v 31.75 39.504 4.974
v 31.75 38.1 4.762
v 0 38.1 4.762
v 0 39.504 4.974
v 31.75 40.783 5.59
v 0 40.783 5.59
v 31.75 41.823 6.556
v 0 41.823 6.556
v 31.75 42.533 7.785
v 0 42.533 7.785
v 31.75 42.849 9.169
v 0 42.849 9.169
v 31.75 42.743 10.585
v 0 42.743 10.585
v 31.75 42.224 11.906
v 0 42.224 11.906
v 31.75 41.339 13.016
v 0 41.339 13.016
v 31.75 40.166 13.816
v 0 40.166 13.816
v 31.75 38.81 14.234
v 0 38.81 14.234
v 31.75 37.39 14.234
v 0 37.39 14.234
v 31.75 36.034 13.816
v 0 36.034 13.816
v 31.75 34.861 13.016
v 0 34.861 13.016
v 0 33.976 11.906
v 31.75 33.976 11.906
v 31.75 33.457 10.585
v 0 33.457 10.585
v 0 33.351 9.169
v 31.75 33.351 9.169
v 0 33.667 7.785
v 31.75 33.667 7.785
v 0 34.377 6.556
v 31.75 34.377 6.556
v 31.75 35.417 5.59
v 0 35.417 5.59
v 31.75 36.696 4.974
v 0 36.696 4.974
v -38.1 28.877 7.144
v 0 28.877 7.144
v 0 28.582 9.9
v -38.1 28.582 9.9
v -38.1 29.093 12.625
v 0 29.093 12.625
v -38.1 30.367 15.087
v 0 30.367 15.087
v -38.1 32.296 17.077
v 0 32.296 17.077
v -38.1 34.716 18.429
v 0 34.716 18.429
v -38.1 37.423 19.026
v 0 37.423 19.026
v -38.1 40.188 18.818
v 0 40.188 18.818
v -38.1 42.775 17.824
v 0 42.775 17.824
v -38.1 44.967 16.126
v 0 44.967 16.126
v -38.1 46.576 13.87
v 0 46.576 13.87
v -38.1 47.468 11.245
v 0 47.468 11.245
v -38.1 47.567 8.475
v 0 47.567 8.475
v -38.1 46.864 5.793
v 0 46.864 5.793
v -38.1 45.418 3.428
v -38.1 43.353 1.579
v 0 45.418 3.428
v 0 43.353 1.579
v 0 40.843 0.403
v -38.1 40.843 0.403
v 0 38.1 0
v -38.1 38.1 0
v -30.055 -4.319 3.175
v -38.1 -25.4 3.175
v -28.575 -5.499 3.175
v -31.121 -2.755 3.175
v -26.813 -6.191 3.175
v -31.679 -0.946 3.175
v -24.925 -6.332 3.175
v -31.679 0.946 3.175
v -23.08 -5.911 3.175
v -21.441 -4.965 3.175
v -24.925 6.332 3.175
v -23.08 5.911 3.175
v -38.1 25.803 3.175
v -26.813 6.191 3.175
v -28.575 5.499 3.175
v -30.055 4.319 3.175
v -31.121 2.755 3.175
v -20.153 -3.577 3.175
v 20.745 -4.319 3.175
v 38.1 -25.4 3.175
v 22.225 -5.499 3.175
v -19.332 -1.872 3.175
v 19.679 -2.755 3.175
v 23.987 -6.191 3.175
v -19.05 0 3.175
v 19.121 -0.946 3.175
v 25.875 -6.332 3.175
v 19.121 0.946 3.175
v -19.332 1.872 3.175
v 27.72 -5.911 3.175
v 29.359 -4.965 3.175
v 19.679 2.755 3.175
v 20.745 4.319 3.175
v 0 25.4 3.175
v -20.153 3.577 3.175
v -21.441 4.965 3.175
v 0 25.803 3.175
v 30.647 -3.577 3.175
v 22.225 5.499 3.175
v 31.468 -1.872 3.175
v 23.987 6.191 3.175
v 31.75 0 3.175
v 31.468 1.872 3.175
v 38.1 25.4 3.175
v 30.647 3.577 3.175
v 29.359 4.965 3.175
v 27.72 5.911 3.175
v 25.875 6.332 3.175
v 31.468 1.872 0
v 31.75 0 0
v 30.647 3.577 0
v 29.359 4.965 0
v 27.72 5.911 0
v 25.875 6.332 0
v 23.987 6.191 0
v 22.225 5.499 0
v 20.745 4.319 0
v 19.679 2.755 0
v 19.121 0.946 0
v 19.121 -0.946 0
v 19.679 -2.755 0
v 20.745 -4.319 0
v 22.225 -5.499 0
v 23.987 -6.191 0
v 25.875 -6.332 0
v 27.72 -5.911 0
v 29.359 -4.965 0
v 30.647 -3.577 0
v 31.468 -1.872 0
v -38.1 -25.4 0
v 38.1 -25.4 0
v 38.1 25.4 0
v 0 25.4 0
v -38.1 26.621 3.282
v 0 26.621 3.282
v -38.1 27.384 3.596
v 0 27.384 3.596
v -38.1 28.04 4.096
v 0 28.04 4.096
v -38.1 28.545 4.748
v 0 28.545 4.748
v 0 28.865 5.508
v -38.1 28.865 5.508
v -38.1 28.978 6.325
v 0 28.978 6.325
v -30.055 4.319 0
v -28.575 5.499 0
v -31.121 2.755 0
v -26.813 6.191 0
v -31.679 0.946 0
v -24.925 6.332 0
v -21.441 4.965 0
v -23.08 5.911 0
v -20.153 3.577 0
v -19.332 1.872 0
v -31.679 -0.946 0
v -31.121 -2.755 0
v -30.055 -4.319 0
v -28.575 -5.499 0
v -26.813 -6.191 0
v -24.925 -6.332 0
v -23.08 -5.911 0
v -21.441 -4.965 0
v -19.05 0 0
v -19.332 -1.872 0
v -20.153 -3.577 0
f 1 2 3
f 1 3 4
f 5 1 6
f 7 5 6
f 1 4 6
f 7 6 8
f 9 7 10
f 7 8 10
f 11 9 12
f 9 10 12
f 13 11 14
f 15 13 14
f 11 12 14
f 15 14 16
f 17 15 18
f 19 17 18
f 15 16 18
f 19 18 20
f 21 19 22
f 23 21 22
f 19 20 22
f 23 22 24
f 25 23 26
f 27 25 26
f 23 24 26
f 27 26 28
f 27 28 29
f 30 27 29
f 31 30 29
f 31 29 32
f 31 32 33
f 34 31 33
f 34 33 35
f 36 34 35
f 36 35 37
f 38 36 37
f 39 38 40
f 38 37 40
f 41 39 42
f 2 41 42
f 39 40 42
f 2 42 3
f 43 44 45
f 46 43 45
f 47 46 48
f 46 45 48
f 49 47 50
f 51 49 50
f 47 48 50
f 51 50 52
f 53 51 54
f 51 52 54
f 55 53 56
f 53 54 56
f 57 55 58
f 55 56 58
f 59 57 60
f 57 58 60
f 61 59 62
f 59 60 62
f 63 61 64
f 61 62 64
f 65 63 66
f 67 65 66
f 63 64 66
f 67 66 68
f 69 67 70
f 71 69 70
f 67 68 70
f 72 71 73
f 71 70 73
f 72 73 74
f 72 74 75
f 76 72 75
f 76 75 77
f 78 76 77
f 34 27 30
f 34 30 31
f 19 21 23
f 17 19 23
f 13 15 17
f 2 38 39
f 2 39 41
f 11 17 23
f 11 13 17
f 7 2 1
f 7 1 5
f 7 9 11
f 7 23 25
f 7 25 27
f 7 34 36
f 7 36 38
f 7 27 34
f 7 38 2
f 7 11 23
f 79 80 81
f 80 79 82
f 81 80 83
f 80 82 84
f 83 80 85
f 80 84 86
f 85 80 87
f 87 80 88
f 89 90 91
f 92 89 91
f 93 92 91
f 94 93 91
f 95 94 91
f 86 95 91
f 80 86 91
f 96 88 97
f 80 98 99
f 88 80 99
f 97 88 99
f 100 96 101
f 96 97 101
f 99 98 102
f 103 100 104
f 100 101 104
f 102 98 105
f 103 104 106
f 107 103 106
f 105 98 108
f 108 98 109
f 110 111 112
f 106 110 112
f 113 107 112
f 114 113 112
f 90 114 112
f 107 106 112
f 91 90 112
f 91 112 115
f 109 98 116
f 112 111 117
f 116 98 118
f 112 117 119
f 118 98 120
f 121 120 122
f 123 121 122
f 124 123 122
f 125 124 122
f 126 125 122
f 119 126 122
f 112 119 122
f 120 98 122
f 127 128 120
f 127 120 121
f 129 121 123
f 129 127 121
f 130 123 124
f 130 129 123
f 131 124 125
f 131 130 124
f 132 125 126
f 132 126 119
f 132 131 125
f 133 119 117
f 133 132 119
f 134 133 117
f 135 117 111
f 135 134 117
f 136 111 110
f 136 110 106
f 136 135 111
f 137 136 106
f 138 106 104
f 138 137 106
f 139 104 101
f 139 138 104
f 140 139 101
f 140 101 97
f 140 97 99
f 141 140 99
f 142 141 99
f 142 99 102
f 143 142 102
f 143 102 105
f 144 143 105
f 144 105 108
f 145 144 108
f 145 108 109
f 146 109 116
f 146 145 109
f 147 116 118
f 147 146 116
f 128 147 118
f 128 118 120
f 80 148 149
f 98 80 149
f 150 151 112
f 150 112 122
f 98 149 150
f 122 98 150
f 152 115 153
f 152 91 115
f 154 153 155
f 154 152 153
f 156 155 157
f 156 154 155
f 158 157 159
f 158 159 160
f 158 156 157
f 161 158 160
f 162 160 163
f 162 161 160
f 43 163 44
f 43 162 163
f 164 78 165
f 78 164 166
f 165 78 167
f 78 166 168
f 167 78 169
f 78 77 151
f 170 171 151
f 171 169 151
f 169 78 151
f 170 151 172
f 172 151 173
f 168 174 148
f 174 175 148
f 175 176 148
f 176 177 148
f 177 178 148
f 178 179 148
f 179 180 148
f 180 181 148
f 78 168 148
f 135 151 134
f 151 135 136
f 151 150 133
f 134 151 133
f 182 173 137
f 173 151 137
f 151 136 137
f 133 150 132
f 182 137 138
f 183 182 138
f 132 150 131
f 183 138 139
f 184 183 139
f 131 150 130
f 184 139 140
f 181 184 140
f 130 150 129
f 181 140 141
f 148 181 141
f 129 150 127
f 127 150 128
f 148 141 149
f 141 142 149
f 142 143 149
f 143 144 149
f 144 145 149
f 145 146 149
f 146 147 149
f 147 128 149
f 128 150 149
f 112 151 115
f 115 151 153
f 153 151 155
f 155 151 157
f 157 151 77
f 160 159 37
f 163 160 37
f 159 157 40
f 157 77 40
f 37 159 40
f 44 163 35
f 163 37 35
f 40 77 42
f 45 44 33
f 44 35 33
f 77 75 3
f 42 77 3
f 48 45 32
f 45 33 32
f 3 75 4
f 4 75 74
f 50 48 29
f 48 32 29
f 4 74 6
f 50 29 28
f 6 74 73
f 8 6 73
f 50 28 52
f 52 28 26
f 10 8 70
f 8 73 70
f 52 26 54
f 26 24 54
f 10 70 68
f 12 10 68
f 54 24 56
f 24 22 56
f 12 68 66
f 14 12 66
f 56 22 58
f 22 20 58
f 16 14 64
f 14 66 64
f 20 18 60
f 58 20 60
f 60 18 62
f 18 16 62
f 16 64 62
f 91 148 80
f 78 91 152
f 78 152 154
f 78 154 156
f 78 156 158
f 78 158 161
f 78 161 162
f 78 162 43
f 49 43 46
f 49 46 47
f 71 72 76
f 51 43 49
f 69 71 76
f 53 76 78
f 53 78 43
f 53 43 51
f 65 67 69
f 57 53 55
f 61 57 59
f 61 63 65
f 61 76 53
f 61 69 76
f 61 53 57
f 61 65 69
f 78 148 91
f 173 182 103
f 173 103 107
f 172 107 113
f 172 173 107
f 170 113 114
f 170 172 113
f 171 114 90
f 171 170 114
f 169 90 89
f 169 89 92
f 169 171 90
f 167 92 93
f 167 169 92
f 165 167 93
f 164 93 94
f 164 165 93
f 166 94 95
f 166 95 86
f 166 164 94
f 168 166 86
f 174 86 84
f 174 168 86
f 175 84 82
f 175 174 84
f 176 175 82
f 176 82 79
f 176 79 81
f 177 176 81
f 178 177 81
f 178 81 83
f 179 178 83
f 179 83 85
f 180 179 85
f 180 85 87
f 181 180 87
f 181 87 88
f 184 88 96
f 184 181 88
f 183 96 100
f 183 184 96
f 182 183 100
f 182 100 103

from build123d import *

# Parameters (mm, degrees)
SKETCH1_W           = 76.2
SKETCH1_H           = 50.8
SKETCH1_R           = 6.35
BOSS_EXTRUDE1_DEPTH = 3.175
BOSS_EXTRUDE2_DEPTH = 38.1
FILLET1_R           = 3.175
SKETCH3_2_R         = 4.7625
BOSS_EXTRUDE3_DEPTH = 31.75


with BuildPart() as part:
    # Sketch1 → Boss-Extrude1 (new body)
    with BuildSketch(Plane.XY):
        Rectangle(SKETCH1_W, SKETCH1_H)
        with Locations((-25.4, 0)):
            Circle(SKETCH1_R, mode=Mode.SUBTRACT)
        with Locations((25.4, 0)):
            Circle(SKETCH1_R, mode=Mode.SUBTRACT)
    extrude(amount=BOSS_EXTRUDE1_DEPTH)

    # Sketch2 → Boss-Extrude2 (add)
    with BuildSketch(Plane(origin=(0, 0, 0), x_dir=(0, 0, -1), z_dir=(1, 0, 0))):
        with BuildLine():
            Line((0, 38.1), (0, 25.4))
            Line((0, 25.4), (-3.175, 25.4))
            Line((-3.175, 25.4), (-3.175, 31.000484171))
            ThreePointArc((-3.175, 31.000484171), (-18.2200956, 41.988564967), (0, 38.1))
        make_face()
    extrude(amount=-BOSS_EXTRUDE2_DEPTH)

    # Fillet1
    fillet1_edges = [part.edges().sort_by_distance(p)[0] for p in [
        (-19.05, 31.000484171, 3.175),
    ]]
    fillet(fillet1_edges, radius=FILLET1_R)

    # Sketch3<2> → Boss-Extrude3 (add)
    with BuildSketch(Plane(origin=(0, 0, 0), x_dir=(0, 0, -1), z_dir=(1, 0, 0))):
        with Locations((-9.525, 38.1)):
            Circle(SKETCH3_2_R)
    extrude(amount=BOSS_EXTRUDE3_DEPTH)


solid = part.part
